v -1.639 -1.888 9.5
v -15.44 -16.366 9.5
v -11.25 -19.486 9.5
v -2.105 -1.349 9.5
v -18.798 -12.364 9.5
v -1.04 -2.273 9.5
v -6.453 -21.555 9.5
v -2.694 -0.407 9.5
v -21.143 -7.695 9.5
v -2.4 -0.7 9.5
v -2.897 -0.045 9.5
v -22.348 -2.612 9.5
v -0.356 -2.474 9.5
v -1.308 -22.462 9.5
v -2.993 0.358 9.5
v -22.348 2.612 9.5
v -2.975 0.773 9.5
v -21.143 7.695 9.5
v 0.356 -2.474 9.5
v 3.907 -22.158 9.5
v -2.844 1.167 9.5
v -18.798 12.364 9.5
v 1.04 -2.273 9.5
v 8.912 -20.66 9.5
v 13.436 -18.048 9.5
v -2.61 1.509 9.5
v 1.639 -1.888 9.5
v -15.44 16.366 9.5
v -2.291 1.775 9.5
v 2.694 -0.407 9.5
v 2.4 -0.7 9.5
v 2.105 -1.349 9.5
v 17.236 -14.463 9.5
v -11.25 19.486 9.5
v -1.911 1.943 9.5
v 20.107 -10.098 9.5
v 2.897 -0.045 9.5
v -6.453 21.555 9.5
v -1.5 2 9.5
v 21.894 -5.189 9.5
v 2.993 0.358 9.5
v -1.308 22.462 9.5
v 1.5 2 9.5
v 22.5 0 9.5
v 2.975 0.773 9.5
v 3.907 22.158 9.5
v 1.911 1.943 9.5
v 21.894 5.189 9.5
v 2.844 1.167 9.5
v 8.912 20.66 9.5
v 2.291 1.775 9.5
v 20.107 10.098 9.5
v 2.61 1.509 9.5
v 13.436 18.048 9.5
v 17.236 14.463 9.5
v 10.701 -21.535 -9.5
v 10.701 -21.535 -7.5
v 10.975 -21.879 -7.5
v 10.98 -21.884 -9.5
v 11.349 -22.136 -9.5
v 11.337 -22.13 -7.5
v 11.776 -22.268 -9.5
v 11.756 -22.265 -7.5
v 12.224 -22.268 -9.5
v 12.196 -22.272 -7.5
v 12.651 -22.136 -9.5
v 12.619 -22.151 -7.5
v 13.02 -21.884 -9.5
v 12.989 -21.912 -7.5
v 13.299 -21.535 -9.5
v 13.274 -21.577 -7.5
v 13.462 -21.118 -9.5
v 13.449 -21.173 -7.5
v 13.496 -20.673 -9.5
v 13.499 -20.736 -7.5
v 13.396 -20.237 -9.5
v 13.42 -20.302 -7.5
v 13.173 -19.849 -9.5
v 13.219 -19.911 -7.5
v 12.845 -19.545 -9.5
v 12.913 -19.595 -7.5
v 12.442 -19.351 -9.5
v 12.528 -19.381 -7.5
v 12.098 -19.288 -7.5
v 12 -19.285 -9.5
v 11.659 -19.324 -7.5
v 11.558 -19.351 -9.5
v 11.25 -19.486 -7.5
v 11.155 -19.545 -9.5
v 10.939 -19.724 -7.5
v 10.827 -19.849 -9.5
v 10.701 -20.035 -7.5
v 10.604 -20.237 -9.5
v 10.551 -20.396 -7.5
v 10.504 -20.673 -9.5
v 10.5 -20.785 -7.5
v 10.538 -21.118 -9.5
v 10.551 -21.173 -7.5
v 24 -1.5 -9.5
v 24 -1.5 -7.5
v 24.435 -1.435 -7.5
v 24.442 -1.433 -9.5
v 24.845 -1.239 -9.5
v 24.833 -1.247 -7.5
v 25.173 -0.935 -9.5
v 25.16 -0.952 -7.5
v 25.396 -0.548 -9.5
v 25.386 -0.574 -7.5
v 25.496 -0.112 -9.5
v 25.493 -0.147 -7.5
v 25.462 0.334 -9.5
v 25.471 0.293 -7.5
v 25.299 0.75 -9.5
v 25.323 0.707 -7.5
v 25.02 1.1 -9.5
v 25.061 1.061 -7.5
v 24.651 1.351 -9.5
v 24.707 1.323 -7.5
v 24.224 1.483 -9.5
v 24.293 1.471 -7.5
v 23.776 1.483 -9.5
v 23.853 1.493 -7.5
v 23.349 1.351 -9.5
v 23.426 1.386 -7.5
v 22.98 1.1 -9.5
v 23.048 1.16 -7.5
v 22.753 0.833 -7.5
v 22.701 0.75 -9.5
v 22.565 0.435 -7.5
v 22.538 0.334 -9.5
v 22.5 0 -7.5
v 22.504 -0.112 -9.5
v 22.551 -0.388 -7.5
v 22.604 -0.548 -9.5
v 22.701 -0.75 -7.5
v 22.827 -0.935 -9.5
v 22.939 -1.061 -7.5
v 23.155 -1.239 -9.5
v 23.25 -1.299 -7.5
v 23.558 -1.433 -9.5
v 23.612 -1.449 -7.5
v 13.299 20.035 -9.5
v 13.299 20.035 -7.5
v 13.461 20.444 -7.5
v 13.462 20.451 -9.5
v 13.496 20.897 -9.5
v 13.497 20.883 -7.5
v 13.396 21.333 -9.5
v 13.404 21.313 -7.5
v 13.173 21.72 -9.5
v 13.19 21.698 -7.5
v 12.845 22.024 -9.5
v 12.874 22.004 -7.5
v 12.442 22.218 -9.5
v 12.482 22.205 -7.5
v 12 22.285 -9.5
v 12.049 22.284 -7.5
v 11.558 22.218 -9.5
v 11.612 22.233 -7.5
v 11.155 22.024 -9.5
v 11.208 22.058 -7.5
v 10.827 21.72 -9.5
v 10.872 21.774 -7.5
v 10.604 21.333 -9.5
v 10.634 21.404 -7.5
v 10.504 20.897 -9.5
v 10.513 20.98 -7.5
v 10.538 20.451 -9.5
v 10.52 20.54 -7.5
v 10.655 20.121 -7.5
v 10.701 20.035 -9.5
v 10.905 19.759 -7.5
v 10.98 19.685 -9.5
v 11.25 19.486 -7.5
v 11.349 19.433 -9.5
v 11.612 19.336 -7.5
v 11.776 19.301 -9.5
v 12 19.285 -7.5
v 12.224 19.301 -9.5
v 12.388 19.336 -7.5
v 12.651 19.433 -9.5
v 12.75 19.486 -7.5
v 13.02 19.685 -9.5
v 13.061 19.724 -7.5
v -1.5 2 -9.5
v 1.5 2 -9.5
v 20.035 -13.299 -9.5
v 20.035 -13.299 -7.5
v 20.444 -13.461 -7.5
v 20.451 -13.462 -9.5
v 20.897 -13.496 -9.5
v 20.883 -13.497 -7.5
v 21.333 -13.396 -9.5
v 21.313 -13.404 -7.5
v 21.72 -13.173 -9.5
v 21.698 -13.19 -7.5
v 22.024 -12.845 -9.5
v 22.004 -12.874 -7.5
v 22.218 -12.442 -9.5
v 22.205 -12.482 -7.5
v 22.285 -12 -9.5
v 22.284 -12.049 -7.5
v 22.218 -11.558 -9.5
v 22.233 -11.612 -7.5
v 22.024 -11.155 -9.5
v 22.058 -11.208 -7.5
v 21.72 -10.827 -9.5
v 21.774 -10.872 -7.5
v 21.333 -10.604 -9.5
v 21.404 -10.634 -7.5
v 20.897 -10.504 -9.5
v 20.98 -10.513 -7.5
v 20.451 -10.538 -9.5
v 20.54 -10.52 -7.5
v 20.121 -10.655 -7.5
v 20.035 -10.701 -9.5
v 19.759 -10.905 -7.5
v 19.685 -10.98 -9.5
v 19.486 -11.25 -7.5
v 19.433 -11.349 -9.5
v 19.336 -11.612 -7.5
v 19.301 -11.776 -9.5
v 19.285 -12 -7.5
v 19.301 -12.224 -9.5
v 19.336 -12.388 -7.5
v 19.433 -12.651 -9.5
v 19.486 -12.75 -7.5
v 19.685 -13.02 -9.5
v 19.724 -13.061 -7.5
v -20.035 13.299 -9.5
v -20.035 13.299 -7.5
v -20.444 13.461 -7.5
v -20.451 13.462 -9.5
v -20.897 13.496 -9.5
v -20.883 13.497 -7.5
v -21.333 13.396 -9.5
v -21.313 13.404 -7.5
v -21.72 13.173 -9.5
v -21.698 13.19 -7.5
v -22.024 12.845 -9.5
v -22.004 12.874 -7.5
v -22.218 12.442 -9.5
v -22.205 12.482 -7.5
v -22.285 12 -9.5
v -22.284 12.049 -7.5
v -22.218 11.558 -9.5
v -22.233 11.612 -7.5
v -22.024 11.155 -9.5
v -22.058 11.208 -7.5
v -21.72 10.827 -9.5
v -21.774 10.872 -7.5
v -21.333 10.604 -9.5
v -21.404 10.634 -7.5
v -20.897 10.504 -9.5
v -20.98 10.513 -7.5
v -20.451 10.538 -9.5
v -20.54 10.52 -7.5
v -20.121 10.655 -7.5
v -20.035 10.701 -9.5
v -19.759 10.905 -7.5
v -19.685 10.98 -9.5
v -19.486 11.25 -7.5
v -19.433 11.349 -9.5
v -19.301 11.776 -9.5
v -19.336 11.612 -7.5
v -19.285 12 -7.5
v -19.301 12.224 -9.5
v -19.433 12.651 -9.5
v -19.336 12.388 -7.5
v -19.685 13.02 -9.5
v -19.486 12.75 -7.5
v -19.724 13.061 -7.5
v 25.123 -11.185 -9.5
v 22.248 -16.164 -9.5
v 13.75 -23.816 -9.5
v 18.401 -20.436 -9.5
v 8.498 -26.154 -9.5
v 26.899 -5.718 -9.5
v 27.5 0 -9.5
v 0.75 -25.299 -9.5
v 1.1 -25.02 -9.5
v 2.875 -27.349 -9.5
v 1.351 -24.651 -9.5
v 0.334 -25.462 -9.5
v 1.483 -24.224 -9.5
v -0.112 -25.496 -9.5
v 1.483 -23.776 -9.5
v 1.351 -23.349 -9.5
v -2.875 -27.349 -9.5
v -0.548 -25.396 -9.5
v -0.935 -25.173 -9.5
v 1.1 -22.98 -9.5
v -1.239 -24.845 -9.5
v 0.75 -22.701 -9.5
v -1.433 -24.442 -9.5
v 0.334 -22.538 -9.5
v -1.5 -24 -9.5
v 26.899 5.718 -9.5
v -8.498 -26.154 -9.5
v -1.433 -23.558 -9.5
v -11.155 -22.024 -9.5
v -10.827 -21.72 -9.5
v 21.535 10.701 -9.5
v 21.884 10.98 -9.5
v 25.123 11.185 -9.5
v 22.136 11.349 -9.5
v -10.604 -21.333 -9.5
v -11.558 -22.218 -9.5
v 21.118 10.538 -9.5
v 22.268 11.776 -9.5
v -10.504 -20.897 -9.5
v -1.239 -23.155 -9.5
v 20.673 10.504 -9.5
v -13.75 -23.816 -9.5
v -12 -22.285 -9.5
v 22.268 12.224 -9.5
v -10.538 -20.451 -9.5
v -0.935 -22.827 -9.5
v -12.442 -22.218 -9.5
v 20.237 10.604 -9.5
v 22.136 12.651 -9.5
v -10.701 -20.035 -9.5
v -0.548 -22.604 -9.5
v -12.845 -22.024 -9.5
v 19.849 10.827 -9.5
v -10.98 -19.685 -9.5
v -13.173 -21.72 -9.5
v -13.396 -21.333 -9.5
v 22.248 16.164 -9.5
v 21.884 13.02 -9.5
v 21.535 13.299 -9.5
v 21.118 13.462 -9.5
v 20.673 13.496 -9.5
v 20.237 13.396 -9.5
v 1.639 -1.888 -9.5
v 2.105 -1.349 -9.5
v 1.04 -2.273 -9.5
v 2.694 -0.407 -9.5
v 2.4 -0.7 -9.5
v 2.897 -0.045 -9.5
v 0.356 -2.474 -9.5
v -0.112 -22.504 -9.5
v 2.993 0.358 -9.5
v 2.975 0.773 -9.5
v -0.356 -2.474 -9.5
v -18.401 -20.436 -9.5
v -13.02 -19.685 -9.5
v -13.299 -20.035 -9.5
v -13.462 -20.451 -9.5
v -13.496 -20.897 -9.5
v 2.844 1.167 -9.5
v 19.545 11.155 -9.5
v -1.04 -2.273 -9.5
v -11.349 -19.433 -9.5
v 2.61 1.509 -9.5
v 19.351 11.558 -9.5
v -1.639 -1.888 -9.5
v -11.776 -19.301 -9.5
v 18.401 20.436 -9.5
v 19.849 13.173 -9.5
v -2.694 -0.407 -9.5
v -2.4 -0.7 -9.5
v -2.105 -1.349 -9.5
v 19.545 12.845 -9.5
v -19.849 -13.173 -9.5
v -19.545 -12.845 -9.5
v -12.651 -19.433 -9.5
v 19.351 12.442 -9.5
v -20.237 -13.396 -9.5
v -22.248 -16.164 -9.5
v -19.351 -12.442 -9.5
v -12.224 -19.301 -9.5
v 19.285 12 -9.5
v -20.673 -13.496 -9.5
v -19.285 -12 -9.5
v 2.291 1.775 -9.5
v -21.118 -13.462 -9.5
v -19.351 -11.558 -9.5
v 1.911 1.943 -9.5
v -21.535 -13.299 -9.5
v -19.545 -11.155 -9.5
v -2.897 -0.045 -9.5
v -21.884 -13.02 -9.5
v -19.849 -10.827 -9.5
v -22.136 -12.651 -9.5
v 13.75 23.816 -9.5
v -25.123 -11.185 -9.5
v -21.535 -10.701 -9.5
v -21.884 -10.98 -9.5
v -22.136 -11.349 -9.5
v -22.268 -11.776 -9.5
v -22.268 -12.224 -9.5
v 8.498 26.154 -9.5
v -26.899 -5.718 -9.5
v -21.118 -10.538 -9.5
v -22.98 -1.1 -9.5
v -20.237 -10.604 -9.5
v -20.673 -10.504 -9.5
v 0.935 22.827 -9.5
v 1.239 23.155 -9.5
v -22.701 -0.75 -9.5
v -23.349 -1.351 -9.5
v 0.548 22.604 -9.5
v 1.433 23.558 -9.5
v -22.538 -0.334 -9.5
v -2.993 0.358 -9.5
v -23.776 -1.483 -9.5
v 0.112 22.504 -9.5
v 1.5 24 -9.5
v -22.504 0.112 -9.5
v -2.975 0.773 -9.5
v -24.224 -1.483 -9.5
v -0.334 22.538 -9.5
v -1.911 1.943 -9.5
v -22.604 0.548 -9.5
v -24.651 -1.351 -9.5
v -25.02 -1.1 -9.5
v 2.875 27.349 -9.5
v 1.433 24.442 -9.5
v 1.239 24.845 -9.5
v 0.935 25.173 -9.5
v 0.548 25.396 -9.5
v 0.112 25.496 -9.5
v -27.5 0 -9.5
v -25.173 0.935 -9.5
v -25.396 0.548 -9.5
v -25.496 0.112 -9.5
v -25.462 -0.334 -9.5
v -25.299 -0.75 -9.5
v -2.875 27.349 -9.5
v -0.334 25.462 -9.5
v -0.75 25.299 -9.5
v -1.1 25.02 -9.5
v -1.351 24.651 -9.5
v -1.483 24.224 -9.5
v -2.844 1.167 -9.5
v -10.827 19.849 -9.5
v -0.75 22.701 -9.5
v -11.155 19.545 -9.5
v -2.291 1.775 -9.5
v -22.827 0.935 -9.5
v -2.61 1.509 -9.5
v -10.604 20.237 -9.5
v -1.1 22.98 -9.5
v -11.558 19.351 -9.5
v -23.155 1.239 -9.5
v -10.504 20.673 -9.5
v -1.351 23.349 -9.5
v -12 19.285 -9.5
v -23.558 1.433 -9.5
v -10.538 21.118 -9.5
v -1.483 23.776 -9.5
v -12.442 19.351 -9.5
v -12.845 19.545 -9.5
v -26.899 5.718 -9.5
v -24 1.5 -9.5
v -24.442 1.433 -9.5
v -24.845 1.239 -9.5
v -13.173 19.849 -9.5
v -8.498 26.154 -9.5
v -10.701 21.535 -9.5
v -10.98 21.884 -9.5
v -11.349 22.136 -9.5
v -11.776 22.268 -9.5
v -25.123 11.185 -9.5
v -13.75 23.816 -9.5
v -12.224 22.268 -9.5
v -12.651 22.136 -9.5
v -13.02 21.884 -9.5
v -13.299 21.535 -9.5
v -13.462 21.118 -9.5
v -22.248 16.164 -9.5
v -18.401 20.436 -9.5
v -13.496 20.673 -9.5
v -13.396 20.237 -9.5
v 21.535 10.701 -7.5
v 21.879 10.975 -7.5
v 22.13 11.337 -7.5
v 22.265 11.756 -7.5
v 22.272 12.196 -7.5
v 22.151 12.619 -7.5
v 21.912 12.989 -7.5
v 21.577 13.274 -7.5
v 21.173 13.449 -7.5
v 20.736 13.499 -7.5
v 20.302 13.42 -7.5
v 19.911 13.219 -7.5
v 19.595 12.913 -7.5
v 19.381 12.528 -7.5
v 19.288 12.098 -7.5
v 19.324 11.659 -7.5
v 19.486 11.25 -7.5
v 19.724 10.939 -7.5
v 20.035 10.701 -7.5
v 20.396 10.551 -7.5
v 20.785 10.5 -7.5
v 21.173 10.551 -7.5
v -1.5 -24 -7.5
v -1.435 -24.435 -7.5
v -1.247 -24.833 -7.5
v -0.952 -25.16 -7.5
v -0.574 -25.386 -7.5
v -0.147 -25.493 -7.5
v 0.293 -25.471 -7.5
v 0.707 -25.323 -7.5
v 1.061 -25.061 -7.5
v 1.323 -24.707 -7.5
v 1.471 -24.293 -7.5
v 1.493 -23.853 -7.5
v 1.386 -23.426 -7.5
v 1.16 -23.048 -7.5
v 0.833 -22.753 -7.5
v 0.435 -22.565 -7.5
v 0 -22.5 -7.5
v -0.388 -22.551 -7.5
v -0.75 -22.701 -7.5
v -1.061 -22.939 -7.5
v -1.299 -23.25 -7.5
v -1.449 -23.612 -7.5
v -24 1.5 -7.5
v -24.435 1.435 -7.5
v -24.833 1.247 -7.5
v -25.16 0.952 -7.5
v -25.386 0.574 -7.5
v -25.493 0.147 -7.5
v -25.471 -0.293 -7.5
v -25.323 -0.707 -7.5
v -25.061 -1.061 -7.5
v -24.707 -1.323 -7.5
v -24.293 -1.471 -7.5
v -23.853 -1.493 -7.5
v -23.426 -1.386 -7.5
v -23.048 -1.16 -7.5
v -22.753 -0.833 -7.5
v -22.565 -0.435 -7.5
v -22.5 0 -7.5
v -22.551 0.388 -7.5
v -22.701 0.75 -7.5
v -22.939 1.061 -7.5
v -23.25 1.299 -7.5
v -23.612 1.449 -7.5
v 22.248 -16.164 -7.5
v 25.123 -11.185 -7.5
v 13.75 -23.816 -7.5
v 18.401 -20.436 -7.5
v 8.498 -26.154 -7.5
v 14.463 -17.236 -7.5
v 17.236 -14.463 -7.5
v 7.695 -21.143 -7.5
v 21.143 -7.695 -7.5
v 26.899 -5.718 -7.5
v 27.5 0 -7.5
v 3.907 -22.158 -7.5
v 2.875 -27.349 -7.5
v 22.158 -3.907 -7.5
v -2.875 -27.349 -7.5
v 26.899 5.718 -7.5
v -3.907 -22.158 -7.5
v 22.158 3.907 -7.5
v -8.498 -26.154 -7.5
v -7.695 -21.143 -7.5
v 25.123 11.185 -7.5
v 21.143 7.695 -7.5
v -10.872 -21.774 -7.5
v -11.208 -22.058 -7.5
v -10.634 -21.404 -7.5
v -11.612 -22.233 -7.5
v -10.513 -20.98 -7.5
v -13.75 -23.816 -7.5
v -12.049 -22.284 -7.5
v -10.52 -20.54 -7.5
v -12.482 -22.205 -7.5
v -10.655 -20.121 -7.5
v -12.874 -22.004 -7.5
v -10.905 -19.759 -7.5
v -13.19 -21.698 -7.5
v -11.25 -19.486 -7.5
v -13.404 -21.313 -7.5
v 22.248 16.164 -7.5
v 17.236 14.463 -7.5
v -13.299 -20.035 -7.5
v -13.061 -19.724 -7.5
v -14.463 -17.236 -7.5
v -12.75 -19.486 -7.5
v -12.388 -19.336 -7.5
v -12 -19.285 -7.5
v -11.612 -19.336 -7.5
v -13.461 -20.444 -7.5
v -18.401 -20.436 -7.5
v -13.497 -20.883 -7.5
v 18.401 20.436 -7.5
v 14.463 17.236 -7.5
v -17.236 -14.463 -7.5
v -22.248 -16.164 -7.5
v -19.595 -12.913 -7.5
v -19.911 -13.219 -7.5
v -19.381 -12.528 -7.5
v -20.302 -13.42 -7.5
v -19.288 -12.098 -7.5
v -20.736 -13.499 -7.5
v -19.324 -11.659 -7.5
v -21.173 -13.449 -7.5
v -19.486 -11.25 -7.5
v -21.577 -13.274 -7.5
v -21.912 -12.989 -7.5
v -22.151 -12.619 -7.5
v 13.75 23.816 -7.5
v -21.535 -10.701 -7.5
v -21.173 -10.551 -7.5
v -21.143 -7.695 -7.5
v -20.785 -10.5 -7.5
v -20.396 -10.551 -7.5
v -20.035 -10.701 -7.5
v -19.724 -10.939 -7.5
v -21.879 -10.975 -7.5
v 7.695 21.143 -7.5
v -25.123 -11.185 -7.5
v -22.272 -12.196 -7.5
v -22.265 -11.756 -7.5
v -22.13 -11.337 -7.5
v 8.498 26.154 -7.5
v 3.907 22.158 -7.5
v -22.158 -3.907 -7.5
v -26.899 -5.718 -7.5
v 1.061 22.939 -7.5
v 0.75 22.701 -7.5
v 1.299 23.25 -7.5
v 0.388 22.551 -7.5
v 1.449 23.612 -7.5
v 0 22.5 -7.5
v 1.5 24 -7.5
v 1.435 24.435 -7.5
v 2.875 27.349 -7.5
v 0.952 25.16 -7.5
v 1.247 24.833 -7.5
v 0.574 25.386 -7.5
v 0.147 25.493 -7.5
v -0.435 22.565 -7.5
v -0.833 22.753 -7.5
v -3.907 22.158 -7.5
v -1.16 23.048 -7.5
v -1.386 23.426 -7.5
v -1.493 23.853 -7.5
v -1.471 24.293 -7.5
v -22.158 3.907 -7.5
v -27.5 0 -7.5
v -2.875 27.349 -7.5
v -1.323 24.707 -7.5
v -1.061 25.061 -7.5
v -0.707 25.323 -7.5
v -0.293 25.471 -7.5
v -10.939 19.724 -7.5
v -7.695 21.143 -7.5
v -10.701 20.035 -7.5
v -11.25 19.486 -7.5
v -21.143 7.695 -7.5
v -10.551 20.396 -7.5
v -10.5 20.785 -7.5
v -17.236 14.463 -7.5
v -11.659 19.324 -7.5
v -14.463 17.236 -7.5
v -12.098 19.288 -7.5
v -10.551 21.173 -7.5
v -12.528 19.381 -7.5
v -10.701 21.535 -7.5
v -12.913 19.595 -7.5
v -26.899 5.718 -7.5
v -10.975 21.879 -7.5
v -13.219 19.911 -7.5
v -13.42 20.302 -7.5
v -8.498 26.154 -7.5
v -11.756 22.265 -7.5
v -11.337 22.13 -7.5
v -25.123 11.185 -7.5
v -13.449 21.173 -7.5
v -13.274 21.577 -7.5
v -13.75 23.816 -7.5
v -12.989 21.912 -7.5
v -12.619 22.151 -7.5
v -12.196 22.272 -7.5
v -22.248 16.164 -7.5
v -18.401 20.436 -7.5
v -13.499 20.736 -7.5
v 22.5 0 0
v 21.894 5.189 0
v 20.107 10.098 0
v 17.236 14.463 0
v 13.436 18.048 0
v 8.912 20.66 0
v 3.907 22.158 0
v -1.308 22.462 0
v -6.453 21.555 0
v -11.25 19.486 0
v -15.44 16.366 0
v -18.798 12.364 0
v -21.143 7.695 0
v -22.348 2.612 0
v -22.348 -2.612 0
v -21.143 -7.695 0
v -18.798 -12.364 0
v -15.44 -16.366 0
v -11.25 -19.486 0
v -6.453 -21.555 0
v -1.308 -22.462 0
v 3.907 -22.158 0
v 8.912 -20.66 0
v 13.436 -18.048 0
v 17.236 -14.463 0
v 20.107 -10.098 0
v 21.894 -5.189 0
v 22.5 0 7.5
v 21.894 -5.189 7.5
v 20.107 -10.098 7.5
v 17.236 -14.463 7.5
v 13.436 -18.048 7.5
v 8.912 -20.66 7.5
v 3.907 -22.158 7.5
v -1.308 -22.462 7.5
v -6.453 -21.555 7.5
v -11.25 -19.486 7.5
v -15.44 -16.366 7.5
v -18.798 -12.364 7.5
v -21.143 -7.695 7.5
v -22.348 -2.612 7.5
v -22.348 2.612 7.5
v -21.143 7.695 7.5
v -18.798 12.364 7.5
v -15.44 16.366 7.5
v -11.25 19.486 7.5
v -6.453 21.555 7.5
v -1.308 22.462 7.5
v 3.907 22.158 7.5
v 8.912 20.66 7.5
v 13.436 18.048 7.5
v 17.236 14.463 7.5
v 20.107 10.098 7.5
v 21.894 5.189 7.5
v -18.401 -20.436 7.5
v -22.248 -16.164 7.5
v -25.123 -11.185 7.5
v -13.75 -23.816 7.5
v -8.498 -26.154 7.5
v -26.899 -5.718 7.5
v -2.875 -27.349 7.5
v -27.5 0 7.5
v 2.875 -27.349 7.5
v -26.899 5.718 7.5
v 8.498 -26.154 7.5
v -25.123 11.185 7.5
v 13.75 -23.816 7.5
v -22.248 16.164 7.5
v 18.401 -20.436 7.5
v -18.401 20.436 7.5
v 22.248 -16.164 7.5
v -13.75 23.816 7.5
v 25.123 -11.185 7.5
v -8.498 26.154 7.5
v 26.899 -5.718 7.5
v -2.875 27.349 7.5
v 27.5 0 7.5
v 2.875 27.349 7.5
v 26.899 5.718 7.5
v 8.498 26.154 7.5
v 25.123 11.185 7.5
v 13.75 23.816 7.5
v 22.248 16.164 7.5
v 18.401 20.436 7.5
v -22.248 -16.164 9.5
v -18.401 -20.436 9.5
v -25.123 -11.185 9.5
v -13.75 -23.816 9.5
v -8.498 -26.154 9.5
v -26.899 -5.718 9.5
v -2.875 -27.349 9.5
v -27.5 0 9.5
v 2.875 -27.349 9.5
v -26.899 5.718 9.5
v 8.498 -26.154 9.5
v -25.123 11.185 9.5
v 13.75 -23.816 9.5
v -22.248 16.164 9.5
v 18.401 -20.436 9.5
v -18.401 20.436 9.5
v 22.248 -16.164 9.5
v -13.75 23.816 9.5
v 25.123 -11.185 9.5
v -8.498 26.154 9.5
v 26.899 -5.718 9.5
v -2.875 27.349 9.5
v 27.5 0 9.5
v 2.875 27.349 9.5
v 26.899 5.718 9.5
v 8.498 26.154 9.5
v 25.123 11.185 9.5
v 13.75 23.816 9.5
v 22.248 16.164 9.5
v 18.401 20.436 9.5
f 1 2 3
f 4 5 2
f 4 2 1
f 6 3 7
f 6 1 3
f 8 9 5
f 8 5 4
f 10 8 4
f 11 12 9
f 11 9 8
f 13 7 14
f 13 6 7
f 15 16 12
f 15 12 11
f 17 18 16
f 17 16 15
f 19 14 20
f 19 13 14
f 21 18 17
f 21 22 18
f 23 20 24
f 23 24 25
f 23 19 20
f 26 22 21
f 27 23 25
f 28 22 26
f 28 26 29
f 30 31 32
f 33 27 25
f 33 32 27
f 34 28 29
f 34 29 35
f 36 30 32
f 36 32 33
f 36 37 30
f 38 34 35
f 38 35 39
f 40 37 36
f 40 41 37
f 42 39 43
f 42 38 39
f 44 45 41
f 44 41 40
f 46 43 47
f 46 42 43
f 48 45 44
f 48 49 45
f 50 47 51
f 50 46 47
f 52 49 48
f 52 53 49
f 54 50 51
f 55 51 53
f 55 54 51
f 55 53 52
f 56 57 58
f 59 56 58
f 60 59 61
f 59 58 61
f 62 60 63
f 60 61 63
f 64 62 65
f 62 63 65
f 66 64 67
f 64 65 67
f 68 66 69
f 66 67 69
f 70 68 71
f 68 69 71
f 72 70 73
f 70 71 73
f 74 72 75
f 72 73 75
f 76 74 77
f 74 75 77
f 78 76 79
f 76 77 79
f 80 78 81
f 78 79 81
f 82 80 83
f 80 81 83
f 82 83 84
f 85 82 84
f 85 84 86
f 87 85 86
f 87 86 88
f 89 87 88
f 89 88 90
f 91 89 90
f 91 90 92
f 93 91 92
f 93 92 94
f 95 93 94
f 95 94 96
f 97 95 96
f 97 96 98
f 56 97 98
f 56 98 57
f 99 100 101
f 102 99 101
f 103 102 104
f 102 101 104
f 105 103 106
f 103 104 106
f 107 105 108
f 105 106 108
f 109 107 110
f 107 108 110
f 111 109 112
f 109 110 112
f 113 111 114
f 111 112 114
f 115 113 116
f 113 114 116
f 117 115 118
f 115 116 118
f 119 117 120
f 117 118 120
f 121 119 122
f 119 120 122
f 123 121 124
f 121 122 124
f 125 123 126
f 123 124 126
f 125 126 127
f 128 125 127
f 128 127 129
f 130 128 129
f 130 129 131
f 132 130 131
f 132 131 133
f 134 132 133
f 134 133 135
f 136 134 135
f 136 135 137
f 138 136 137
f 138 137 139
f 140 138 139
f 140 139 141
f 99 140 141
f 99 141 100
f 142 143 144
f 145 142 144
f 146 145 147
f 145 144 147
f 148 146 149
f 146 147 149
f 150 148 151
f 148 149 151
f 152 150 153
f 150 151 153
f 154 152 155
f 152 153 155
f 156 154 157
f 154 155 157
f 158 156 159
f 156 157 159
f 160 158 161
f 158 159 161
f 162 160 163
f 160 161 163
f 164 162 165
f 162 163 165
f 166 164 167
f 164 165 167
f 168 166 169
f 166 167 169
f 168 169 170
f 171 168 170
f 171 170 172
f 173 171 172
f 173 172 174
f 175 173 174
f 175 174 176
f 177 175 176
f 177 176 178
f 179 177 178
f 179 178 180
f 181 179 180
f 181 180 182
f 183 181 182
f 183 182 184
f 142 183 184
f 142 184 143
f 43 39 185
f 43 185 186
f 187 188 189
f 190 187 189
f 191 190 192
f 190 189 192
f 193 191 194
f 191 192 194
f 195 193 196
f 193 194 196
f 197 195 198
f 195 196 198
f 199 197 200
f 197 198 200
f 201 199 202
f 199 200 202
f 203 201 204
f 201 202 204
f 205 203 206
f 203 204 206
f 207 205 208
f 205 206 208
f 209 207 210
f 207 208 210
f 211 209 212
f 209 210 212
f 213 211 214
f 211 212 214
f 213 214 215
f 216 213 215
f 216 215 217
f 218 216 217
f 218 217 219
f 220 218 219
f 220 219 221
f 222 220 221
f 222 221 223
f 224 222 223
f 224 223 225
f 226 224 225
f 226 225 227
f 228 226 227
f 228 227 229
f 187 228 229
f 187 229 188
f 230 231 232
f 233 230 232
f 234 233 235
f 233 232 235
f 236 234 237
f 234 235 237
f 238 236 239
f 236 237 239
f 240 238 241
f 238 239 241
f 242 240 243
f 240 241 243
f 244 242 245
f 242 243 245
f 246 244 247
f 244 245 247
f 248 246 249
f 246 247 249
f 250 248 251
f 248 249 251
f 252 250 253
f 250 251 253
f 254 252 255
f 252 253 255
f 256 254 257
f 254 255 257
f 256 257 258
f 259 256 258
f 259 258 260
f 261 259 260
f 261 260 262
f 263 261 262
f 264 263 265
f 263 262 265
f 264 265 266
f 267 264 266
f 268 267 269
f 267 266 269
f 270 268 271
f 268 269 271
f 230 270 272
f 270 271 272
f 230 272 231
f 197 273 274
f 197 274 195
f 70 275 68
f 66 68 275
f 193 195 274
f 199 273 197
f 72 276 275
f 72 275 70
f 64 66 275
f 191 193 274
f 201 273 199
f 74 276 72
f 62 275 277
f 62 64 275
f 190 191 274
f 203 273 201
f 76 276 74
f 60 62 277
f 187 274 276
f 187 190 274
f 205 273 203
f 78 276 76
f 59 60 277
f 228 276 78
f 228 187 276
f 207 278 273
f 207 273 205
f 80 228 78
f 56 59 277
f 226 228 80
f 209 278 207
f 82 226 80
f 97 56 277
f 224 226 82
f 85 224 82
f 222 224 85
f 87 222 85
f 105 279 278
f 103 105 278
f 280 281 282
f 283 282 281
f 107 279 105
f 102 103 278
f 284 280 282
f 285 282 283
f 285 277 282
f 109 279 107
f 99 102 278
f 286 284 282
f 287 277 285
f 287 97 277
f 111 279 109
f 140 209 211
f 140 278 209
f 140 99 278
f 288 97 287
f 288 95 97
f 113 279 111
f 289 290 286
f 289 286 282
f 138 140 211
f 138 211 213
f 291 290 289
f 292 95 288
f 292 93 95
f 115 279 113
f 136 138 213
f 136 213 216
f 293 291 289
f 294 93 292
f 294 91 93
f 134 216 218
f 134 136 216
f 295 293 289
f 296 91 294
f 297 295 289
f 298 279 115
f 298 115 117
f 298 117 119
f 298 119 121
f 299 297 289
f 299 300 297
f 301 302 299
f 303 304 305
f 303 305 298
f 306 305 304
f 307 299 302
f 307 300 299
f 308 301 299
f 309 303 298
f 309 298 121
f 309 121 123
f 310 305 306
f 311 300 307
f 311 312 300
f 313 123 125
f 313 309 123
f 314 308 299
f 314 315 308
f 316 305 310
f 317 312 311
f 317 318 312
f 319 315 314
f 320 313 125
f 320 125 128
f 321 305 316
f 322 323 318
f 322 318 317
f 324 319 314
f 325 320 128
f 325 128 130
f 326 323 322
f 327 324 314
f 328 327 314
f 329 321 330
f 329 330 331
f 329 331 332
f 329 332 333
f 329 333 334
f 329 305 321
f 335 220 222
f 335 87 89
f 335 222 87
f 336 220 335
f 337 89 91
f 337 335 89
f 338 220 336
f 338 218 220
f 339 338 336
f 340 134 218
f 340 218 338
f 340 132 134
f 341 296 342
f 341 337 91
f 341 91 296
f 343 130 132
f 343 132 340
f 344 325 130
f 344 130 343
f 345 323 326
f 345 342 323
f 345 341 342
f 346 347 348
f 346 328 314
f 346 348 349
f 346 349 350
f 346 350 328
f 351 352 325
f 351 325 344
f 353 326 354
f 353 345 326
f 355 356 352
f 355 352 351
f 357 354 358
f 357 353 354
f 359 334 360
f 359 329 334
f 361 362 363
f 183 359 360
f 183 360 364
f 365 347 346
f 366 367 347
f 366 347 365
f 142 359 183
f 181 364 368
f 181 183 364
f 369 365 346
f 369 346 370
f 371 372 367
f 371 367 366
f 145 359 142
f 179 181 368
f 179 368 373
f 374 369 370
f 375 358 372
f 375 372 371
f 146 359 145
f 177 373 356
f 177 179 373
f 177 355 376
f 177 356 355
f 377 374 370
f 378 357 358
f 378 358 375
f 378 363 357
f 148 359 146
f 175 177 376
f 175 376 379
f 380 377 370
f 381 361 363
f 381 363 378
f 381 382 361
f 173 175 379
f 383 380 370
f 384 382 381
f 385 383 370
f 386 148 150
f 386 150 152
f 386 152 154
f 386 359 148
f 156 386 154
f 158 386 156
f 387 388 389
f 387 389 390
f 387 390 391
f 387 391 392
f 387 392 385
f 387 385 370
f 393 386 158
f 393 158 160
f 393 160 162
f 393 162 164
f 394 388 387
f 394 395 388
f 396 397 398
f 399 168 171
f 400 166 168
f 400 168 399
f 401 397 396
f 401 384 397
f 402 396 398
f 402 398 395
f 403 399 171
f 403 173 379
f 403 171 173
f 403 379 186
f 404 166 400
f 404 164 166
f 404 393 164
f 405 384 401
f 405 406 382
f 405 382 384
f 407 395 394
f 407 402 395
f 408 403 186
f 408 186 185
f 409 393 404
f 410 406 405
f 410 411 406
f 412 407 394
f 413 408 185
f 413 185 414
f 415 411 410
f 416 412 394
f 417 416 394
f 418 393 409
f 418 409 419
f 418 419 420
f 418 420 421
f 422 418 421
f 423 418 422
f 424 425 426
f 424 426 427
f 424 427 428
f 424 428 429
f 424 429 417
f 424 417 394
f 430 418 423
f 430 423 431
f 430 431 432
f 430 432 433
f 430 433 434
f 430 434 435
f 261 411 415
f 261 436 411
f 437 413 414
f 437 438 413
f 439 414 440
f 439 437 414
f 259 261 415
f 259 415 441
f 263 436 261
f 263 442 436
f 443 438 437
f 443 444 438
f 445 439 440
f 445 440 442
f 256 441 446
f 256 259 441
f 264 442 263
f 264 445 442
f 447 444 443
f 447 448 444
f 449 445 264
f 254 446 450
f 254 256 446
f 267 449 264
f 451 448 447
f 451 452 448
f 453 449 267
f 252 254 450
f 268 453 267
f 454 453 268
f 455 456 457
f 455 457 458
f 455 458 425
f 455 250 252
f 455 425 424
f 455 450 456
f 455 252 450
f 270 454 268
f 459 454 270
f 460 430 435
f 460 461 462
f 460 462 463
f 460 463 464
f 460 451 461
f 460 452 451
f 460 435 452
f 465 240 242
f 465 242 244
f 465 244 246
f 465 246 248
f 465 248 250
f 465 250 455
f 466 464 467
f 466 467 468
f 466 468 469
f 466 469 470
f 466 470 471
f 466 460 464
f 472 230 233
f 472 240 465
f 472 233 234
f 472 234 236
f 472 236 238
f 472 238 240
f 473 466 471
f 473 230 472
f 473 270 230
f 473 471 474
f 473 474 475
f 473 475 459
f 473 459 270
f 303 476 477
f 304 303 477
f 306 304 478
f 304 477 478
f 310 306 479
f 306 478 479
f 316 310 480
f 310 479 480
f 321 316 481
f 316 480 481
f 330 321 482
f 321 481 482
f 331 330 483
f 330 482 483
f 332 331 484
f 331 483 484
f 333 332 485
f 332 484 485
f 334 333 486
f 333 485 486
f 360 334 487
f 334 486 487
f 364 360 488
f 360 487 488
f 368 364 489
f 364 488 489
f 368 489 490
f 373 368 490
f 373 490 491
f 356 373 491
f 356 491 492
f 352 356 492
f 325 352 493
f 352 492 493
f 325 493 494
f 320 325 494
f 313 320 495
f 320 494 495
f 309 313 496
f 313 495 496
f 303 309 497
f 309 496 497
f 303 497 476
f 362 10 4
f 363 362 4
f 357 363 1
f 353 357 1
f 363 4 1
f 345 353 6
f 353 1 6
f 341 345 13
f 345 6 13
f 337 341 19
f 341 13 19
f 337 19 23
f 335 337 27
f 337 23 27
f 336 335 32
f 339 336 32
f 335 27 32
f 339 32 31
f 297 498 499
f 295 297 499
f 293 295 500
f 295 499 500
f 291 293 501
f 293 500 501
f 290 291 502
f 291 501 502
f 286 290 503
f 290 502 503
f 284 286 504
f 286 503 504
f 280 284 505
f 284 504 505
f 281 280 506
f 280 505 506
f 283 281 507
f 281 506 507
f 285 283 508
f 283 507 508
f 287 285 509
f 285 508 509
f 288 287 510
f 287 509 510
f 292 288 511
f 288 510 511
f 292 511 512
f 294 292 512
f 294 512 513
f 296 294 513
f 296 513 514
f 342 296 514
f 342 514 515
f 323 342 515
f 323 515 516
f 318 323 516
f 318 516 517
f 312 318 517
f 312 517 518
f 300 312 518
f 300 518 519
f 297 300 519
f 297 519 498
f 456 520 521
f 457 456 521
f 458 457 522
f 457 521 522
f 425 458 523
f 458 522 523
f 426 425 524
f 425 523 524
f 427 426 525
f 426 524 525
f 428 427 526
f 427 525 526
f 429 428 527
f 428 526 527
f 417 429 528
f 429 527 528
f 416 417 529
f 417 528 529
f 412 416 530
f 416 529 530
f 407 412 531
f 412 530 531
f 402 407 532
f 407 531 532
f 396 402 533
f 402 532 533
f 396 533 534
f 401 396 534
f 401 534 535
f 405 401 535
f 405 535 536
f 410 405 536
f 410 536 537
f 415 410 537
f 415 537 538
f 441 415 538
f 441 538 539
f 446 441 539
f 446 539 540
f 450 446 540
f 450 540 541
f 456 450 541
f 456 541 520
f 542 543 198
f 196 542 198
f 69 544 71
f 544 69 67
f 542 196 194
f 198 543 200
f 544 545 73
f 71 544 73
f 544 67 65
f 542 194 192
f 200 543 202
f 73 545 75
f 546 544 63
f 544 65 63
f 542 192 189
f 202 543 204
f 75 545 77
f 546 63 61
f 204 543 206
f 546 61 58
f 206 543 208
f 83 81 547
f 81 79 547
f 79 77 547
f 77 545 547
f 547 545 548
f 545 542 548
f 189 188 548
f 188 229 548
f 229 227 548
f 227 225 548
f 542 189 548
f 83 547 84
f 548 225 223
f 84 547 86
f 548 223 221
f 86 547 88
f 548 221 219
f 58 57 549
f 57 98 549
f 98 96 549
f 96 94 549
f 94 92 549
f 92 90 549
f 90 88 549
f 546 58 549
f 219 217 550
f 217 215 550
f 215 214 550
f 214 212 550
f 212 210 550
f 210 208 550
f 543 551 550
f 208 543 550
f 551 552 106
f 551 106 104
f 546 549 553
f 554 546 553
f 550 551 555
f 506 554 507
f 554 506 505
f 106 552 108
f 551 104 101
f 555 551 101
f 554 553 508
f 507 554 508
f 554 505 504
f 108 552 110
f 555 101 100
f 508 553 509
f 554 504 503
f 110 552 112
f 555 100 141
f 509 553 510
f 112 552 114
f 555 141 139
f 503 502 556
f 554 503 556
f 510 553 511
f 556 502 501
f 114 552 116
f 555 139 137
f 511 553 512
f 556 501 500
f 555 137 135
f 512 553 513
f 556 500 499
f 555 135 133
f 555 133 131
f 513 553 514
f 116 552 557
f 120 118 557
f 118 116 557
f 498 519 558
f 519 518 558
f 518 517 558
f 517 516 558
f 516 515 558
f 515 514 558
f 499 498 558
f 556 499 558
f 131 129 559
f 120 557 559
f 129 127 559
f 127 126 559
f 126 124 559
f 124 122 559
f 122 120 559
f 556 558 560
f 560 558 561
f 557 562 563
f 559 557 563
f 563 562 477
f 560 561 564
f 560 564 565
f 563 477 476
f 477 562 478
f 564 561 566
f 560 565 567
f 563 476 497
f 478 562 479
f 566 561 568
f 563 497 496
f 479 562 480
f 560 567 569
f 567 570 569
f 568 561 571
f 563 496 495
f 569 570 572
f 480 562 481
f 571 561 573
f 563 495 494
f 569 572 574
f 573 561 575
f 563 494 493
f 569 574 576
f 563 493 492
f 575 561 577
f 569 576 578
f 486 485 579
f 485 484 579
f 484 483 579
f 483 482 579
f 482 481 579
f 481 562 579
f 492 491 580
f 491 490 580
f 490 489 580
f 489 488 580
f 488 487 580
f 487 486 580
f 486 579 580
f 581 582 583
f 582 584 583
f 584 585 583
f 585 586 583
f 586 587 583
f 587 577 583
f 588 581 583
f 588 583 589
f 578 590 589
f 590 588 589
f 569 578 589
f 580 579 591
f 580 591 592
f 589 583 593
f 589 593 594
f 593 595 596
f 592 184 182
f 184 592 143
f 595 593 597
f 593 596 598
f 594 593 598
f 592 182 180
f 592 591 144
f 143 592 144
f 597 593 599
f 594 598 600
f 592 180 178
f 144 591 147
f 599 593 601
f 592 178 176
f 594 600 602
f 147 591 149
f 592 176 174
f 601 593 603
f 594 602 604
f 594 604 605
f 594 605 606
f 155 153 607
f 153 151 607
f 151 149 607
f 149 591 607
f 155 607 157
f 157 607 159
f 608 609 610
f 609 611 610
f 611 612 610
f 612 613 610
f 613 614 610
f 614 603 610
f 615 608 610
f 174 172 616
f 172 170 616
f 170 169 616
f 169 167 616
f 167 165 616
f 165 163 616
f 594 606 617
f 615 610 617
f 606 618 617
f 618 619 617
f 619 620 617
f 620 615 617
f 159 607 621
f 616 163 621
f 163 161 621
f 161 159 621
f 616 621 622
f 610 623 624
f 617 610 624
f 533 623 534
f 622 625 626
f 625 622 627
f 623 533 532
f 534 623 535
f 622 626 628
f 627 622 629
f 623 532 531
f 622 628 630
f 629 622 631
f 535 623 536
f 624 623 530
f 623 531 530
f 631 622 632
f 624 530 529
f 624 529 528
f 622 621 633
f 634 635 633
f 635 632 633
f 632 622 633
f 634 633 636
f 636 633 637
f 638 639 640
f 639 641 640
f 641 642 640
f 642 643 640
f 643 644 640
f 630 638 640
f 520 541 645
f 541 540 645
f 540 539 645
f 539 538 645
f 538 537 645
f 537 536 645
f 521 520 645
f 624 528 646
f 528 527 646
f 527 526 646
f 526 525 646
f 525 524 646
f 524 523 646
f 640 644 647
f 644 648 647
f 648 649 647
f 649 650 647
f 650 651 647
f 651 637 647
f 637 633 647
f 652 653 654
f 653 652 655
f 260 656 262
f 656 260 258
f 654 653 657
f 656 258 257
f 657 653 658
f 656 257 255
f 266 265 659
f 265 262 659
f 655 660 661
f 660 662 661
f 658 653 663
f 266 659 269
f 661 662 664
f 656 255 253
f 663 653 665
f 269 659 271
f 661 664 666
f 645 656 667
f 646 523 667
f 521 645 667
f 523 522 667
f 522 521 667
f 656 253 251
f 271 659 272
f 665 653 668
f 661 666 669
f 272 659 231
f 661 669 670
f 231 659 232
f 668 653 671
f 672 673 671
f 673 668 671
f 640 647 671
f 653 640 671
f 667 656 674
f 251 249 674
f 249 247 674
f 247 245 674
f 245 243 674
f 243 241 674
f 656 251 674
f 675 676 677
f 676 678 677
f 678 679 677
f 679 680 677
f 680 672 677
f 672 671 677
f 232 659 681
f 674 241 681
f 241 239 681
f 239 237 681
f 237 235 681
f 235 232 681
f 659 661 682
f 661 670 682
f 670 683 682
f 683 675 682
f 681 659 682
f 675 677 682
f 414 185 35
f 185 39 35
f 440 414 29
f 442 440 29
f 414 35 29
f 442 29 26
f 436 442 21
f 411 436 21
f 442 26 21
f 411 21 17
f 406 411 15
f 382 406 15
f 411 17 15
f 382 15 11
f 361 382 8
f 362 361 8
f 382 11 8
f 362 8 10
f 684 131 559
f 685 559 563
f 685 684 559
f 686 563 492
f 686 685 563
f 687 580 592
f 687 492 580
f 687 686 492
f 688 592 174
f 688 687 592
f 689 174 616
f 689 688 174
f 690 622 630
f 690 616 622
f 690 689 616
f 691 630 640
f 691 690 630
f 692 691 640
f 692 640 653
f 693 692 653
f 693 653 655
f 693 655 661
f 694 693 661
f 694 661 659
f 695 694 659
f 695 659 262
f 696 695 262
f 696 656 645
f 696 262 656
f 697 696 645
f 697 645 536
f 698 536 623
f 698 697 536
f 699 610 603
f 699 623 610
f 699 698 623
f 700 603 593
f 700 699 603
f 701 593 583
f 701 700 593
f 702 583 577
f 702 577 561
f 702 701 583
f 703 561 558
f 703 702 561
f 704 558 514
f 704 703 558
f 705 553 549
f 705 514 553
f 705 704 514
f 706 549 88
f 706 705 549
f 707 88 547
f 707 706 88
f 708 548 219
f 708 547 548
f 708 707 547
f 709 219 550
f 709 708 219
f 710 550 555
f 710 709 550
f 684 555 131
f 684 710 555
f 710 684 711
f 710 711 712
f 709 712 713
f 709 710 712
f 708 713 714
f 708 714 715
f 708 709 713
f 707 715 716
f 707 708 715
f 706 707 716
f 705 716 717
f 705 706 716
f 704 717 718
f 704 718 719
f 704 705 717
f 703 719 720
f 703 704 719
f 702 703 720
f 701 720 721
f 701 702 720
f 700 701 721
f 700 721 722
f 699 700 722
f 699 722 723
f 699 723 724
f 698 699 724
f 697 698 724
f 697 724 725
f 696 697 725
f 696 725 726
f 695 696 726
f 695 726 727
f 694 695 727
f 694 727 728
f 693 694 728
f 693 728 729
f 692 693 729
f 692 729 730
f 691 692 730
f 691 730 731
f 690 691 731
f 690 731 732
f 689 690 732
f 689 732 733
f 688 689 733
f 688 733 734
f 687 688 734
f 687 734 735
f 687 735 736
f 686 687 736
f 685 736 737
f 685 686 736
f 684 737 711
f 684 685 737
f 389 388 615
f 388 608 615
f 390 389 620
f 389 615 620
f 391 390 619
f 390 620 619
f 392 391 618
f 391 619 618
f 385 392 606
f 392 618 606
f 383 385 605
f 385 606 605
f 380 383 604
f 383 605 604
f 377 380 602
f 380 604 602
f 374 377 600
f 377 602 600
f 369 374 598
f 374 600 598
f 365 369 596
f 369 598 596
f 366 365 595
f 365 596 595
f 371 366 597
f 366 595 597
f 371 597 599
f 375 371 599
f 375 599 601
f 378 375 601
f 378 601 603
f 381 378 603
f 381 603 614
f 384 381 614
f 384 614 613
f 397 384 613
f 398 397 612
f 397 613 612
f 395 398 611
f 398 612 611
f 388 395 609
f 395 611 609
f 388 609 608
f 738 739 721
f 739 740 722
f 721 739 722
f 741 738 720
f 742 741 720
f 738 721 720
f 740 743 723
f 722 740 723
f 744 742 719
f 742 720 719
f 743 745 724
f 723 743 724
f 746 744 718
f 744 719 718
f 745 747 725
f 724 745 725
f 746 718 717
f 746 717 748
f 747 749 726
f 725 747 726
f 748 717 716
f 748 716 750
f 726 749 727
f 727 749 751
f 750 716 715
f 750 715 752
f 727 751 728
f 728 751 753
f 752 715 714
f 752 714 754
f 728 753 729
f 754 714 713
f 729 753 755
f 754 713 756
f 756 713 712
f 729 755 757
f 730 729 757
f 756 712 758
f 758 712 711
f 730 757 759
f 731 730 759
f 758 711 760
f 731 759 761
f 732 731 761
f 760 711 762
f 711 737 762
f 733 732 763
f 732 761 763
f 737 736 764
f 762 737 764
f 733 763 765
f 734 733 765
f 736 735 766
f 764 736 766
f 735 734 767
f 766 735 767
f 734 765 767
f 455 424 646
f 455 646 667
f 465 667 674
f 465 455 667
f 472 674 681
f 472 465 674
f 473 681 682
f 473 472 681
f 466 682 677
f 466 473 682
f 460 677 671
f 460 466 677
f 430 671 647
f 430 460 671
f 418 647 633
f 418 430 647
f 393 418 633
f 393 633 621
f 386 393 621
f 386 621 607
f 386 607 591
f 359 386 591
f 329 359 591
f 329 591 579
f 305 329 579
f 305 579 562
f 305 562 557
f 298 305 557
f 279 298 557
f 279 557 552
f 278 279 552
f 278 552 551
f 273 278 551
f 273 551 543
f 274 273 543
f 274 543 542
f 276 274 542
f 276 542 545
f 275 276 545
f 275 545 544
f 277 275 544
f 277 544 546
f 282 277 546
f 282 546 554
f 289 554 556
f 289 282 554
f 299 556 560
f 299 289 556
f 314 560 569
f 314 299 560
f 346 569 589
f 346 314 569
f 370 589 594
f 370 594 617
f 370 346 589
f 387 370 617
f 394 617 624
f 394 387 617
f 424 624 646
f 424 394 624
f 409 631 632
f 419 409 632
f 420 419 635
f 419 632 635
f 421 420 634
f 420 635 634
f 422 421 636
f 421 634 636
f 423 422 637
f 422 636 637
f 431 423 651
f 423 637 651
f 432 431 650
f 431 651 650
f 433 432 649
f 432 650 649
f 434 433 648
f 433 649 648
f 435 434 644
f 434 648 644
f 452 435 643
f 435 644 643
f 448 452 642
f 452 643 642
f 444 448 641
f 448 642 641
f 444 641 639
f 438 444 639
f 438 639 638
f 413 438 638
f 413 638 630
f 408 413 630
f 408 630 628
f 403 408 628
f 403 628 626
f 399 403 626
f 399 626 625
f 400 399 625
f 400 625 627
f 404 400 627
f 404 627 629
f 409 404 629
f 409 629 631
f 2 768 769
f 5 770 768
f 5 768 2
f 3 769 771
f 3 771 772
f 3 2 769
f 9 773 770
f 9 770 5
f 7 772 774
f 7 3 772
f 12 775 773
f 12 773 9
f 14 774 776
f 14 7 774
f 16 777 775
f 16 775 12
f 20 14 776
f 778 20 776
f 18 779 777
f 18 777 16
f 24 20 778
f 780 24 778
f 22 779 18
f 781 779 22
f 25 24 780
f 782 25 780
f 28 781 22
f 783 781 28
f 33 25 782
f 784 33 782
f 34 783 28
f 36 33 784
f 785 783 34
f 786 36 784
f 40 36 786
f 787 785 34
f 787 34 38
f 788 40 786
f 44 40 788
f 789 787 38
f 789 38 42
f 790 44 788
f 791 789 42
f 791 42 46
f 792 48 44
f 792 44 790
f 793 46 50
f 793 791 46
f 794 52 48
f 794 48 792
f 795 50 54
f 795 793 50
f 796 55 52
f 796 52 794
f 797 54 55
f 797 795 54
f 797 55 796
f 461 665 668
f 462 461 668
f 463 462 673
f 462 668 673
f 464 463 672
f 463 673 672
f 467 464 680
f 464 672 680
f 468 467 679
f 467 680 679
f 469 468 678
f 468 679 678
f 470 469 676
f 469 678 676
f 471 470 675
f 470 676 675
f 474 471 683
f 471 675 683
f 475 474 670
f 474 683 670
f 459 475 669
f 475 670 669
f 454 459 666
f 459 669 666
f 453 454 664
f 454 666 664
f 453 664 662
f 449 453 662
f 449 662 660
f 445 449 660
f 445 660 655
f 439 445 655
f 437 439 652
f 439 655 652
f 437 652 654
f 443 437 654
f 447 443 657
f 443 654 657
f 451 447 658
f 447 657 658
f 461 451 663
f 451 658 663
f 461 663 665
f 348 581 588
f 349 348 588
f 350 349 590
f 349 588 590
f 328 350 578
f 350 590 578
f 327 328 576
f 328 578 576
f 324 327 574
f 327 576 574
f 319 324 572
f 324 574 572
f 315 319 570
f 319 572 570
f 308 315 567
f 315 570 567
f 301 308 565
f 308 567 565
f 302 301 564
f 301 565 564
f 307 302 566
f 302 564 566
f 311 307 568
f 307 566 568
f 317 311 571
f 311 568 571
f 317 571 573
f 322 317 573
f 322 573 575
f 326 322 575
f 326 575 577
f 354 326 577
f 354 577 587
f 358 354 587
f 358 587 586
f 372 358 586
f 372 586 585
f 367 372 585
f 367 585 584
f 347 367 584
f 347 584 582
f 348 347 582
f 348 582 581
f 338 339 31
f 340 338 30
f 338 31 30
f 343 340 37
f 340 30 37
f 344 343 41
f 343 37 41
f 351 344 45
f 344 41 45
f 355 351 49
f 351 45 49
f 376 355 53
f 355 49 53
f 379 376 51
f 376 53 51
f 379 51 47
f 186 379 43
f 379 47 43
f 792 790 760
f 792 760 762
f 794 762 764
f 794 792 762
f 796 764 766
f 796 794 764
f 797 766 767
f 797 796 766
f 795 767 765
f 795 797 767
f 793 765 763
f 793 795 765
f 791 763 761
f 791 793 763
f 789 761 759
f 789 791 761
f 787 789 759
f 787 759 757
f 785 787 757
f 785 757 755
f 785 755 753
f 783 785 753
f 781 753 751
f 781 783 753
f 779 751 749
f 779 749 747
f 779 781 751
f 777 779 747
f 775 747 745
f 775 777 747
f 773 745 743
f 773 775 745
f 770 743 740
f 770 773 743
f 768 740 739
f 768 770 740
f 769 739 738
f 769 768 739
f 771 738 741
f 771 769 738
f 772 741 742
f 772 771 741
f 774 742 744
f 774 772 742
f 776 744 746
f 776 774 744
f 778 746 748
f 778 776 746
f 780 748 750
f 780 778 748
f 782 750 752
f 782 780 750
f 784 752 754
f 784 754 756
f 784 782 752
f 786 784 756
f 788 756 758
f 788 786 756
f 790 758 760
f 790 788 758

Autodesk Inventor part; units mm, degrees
ref_plane "YZ Plane" through (0, 0, 0) normal (1, 0, 0) x (0, 1, 0)
ref_plane "XZ Plane" through (0, 0, 0) normal (0, 1, 0) x (-1, 0, 0)
ref_plane "XY Plane" through (0, 0, 0) normal (0, 0, 1) x (1, 0, 0)
sketch "Sketch1" plane through (0, 0, 0) normal (0, 0, 1) x (1, 0, 0)
  circle A0 centre (0, 0) radius 22.5
  dimension "d0" = 45
extrude "Extrusion1" add sketch "Sketch1" along normal mid plane 19
sketch "Sketch2" plane through (0, 0, 9.5) normal (0, 0, 1) x (1, 0, 0)
  circle A0 centre (0, 0) radius 27.5
  circle A1 centre (0, 0) radius 22.5 projected
  dimension "d3" = 5
extrude "Extrusion2" add sketch "Sketch2" against normal blind 2 contours A0 | A1
sketch "Sketch3" plane through (0, 0, -9.5) normal (0, 0, -1) x (-1, 0, 0)
  circle A0 centre (0, 0) radius 27.5 projected
  circle A1 centre (0, 0) radius 22.5 projected
extrude "Extrusion3" add sketch "Sketch3" against normal blind 2
sketch "Sketch4" plane through (0, 0, 9.5) normal (0, 0, 1) x (1, 0, 0)
  circle A0 centre (0, 0) radius 2.5
  line L0 (-1.5, 2) -> (1.5, 2)
  circle A1 centre (-1.5, 0.5) radius 1.5
  line L1 (0, 38.5) -> (0, -38.5) projected
  circle A2 centre (1.5, 0.5) radius 1.5
  point P0 (2.4, -0.7)
  point P1 (1.5, 2)
  point P2 (-2.4, -0.7)
  dimension "d25" = 3
  dimension "d8" = 5
  dimension "d9" = 4.5
extrude "Extrusion4" cut sketch "Sketch4" against normal through all contours A0 A2 | A0 A2 | A2 L1 L0 | A0 L1 A2 | L1 A1 L0 | A1 A0 | L1 A0 A1 | A0 A1
sketch "Sketch5" plane through (0, 0, -7.5) normal (0, 0, 1) x (1, 0, 0)
  line L0 (0, -38.5) -> (0, 38.5) projected
  circle A0 centre (0, 24) radius 1.5
  circle A1 centre (0, 0) radius 22.5 projected
  dimension "d31" = 3
extrude "Extrusion5" cut sketch "Sketch5" against normal through all contours A0 L0 | L0 A0
pattern_circular "Circular Pattern1" count 12 over 360 about axis through (0, 0, -10) along (0, 0, 1) of "Extrusion5"
properties part number "WinderSpoolTraditionalMachining"
